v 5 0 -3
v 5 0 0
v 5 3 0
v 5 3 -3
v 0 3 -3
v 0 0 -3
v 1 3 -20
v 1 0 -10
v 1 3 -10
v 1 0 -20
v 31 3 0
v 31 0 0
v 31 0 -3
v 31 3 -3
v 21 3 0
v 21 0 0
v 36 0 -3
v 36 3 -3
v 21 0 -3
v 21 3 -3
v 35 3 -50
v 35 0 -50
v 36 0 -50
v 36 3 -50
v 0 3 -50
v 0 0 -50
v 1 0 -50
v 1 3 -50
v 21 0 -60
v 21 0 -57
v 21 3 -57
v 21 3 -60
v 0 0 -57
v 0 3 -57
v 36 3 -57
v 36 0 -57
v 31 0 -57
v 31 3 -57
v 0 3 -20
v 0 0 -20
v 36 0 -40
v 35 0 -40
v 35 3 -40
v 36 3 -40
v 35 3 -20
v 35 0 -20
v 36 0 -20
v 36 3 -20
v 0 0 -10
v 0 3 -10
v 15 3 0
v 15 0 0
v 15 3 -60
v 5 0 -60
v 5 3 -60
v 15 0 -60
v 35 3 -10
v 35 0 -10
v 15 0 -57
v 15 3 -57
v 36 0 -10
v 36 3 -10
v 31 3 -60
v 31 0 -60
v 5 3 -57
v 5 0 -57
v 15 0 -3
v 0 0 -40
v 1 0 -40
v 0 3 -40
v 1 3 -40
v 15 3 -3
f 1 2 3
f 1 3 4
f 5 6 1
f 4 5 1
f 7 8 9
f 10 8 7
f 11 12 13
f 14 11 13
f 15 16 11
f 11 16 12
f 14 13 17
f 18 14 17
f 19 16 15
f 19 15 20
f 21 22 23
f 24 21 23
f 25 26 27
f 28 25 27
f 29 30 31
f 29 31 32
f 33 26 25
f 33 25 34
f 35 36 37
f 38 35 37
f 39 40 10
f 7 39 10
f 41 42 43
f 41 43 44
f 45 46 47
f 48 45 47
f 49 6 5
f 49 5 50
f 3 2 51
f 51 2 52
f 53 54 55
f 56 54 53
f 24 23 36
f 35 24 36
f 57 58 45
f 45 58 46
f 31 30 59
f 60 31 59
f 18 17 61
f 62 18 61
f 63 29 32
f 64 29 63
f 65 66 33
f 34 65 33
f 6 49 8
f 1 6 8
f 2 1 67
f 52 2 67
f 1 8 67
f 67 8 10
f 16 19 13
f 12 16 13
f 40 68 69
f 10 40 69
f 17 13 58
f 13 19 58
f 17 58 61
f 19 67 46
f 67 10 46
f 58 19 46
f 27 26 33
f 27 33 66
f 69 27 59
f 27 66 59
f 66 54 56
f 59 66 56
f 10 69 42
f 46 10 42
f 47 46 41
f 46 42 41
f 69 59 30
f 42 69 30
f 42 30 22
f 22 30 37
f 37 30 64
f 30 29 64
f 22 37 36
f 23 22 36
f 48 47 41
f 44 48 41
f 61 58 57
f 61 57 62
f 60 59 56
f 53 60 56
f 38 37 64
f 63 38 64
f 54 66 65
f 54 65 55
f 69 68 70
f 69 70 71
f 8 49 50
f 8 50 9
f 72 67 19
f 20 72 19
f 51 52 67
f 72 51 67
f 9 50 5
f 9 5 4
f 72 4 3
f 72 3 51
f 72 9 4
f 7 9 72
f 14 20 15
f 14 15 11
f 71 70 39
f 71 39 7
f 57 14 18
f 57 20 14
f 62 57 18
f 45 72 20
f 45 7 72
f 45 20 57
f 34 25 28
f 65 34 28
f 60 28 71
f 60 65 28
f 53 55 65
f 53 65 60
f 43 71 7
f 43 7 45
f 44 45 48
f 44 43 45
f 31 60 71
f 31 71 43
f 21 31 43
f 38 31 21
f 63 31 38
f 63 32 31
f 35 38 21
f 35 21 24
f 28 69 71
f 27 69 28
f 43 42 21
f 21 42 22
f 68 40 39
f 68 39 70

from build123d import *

# Parameters (mm, degrees)
SKETCH1_W           = 34
SKETCH1_H           = 54
SKETCH1_W_2         = 10
SKETCH1_H_2         = 3
SKETCH1_W_3         = 1
SKETCH1_H_3         = 7
SKETCH1_H_4         = 20
BOSS_EXTRUDE1_DEPTH = 3


with BuildPart() as part:
    # Sketch1 → Boss-Extrude1 (new body)
    with BuildSketch(Plane(origin=(0, 0, 0), x_dir=(1, 0, 0), z_dir=(0, 1, 0))):
        with Locations((18, 30)):
            Rectangle(SKETCH1_W, SKETCH1_H)
        with Locations((10, 1.5)):
            Rectangle(SKETCH1_W_2, SKETCH1_H_2)
        with Locations((26, 1.5)):
            Rectangle(SKETCH1_W_2, SKETCH1_H_2)
        with Locations((35.5, 6.5)):
            Rectangle(SKETCH1_W_3, SKETCH1_H_3)
        with Locations((35.5, 30)):
            Rectangle(SKETCH1_W_3, SKETCH1_H_4)
        with Locations((35.5, 53.5)):
            Rectangle(SKETCH1_W_3, SKETCH1_H_3)
        with Locations((26, 58.5)):
            Rectangle(SKETCH1_W_2, SKETCH1_H_2)
        with Locations((10, 58.5)):
            Rectangle(SKETCH1_W_2, SKETCH1_H_2)
        with Locations((0.5, 53.5)):
            Rectangle(SKETCH1_W_3, SKETCH1_H_3)
        with Locations((0.5, 30)):
            Rectangle(SKETCH1_W_3, SKETCH1_H_4)
        with Locations((0.5, 6.5)):
            Rectangle(SKETCH1_W_3, SKETCH1_H_3)
    extrude(amount=BOSS_EXTRUDE1_DEPTH)


solid = part.part
